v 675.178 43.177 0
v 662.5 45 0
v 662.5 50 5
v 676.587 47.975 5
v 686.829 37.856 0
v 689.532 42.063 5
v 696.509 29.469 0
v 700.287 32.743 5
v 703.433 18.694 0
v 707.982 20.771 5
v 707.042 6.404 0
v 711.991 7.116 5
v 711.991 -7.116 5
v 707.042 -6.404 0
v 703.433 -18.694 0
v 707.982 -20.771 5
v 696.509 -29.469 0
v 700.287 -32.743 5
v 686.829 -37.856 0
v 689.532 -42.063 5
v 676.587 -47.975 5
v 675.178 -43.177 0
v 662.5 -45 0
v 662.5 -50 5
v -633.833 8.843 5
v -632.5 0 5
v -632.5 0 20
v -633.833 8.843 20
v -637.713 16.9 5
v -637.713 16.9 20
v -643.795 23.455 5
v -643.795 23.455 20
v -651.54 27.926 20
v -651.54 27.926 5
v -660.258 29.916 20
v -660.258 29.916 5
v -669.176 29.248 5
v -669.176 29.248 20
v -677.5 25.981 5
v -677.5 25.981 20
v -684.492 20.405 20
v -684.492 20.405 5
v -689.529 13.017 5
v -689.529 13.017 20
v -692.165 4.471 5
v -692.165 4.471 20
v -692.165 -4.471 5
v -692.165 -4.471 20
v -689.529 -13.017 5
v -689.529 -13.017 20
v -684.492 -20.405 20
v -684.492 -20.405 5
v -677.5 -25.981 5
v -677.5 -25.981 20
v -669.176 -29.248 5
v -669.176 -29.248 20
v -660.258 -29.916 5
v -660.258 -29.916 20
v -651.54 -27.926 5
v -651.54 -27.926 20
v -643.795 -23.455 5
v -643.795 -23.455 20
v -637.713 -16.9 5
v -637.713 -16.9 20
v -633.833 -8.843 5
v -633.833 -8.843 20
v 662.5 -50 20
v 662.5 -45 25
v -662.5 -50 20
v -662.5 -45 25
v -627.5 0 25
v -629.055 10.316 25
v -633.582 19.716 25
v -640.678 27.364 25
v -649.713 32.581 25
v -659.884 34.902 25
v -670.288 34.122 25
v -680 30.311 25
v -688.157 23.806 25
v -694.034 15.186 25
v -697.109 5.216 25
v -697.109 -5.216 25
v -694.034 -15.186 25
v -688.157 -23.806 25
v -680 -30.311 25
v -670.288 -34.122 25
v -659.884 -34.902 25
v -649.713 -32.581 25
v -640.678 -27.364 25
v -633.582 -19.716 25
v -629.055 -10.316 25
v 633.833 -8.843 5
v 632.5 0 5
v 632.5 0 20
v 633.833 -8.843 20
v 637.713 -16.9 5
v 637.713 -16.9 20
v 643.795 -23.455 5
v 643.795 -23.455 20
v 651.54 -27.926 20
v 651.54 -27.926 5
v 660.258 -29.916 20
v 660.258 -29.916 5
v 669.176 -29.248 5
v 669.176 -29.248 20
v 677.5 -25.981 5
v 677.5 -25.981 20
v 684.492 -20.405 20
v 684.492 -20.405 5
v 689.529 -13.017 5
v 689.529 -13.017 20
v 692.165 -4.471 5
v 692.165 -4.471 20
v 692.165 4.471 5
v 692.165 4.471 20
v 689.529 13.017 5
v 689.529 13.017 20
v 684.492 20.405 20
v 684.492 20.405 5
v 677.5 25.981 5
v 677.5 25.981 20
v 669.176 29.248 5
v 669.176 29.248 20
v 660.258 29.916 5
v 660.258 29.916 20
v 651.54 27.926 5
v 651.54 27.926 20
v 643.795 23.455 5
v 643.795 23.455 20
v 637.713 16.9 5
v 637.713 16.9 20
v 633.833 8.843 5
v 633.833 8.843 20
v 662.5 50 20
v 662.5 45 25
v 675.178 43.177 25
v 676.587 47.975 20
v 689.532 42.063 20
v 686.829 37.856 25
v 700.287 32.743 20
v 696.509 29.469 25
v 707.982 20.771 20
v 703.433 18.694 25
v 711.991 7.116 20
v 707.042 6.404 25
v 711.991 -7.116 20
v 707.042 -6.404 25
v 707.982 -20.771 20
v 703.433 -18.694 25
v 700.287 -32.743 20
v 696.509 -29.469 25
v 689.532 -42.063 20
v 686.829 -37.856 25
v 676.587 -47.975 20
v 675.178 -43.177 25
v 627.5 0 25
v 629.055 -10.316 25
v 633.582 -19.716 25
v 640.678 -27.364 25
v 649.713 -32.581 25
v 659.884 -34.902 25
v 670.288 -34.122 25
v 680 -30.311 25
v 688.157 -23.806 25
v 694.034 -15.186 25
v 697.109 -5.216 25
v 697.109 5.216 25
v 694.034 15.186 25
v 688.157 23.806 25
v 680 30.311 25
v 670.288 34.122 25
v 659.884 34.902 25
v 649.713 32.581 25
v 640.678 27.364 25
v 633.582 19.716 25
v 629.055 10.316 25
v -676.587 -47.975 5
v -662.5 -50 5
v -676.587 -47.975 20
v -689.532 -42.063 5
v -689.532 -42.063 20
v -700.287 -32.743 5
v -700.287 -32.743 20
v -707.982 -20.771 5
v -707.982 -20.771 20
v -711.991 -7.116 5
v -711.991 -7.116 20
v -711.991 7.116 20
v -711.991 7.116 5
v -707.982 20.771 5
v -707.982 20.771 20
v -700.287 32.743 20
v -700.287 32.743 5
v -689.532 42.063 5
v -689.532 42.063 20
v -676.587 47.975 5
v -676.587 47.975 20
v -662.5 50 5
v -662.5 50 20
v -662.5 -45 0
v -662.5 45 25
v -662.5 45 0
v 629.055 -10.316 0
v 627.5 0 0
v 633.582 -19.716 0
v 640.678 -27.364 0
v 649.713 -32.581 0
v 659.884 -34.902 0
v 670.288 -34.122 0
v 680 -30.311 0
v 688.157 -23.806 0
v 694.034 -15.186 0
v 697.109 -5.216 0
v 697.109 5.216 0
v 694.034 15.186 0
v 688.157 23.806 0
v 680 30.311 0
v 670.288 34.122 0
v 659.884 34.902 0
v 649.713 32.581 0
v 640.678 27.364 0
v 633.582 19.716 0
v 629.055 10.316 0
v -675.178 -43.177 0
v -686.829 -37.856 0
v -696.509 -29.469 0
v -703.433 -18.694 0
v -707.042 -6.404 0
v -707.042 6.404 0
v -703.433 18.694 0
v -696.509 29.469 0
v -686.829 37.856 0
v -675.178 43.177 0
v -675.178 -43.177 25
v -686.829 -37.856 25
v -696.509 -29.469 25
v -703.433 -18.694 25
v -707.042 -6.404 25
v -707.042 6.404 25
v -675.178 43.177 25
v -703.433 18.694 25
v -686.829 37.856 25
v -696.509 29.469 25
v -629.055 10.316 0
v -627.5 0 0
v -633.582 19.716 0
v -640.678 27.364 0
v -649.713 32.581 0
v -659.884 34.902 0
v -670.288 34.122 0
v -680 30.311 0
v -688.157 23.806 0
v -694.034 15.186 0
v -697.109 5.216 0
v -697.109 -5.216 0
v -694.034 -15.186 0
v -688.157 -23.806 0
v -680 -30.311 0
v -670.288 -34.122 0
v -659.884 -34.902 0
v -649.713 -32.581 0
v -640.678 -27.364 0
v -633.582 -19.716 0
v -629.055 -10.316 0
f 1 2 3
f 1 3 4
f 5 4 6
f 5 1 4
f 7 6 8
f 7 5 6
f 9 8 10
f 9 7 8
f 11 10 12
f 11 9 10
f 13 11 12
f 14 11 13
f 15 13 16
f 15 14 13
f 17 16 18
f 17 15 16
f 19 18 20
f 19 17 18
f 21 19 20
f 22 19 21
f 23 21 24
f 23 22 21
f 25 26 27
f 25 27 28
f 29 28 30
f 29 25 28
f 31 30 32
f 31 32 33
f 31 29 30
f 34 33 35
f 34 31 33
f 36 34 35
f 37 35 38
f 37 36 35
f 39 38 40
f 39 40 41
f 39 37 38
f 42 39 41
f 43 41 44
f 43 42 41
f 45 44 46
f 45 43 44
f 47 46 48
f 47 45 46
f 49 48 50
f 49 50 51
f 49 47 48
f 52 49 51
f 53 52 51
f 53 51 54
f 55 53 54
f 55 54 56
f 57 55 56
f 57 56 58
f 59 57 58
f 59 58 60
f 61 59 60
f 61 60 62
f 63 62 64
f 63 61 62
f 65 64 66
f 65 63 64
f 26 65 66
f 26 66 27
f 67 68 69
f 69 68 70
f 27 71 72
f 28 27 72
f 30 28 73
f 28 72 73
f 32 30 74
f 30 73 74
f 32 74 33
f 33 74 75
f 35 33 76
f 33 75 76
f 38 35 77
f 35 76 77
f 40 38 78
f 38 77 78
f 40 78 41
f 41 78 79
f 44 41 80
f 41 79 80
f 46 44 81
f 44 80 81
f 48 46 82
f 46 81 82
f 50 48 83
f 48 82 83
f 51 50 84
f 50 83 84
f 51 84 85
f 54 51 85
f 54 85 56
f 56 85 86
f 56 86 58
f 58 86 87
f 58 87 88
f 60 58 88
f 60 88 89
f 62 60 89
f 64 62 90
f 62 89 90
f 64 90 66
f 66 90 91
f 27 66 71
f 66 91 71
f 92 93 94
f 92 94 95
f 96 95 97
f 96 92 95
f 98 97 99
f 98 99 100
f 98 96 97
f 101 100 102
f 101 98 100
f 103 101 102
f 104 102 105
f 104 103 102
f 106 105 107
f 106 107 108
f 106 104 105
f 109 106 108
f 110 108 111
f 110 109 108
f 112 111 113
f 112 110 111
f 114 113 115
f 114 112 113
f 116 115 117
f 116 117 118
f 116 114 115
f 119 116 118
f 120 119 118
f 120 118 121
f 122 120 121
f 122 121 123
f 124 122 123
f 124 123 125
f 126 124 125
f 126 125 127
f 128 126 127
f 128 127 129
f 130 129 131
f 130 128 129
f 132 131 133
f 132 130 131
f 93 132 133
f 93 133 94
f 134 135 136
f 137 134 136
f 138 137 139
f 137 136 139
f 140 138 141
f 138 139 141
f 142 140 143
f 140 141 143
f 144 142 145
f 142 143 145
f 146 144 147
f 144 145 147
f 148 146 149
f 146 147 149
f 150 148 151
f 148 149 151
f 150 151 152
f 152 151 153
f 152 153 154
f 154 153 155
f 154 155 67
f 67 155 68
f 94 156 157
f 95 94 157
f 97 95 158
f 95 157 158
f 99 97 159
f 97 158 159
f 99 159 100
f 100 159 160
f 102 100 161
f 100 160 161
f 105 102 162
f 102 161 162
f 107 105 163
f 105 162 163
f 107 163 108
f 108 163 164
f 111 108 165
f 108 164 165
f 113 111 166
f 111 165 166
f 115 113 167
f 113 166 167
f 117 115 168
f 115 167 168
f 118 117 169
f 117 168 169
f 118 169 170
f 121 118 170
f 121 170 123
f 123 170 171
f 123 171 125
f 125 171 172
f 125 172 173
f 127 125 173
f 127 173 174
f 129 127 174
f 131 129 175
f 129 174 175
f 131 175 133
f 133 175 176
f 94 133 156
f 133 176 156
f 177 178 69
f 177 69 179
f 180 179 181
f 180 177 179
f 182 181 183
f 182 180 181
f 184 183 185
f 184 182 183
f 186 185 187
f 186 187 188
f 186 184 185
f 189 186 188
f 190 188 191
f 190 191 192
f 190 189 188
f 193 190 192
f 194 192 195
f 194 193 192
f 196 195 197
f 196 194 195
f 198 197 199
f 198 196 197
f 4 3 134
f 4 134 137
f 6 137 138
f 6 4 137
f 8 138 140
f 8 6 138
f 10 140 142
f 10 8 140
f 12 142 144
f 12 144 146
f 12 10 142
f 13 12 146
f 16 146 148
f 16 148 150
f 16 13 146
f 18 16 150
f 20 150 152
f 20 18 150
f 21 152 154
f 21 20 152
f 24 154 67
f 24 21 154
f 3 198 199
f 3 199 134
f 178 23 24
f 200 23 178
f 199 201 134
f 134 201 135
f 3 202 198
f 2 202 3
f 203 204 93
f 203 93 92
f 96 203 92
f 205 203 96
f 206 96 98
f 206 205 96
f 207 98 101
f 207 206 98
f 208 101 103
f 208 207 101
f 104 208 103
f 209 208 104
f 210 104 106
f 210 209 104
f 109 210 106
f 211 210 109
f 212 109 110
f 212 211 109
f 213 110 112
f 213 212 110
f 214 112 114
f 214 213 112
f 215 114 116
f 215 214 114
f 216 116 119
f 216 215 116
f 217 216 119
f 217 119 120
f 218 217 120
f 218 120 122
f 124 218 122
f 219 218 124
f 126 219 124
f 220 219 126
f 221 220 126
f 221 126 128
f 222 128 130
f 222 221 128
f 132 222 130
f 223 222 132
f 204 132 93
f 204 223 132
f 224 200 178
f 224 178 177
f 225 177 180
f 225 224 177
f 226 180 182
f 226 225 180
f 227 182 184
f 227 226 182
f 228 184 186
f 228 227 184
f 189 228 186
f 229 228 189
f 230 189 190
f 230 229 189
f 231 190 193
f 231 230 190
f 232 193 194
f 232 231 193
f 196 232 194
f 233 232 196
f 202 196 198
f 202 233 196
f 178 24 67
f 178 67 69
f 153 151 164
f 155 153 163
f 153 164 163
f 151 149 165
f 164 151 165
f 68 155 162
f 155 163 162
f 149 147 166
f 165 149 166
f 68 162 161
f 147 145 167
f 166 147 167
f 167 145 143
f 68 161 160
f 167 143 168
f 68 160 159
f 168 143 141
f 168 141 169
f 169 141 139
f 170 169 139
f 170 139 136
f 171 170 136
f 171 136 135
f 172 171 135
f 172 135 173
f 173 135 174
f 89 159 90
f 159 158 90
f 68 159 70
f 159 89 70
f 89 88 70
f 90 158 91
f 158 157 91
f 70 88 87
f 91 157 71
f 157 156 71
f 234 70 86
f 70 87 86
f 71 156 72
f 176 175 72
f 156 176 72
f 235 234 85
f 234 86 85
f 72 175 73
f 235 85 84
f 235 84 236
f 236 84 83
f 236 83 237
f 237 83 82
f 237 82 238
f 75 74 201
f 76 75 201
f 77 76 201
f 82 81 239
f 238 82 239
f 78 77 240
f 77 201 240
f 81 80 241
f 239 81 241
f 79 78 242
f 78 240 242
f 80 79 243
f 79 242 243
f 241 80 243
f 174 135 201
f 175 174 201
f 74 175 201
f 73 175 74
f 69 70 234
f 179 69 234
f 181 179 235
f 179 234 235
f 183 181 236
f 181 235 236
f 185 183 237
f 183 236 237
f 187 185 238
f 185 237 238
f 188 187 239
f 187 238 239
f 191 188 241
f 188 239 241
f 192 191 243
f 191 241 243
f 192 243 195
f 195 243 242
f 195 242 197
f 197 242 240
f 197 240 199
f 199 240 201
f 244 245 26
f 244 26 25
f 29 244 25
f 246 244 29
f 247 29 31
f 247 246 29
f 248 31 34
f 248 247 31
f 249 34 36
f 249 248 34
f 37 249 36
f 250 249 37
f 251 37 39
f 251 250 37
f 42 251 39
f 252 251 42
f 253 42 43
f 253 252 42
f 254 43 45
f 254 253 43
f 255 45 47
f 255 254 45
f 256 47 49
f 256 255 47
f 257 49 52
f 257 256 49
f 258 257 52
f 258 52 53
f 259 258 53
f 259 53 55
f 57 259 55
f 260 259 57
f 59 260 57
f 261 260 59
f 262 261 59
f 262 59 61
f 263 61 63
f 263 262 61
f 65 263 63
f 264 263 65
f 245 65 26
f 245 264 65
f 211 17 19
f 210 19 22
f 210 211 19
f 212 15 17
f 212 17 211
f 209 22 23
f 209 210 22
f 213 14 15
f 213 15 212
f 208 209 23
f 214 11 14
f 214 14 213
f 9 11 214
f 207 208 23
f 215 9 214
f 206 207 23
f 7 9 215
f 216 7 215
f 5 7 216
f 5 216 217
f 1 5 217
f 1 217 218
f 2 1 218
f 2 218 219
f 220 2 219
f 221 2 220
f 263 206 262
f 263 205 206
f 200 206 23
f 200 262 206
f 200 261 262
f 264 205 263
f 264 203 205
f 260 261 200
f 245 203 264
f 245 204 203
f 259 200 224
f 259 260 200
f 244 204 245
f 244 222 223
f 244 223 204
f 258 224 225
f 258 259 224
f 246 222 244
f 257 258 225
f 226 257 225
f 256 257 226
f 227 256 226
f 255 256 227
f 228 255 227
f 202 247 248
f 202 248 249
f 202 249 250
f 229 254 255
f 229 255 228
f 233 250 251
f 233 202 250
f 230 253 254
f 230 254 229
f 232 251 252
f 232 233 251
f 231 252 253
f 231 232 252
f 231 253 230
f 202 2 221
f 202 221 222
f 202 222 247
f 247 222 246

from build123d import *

# Parameters (mm, degrees)
SKETCH1_R           = 30
BOSS_EXTRUDE1_DEPTH = 25
CHAMFER1_SIZE       = 5


with BuildPart() as part:
    # Sketch1 → Boss-Extrude1 (new body)
    with BuildSketch(Plane.XY):
        with BuildLine():
            Line((662.5, -50), (-662.5, -50))
            ThreePointArc((-662.5, -50), (-712.5, 0), (-662.5, 50))
            Line((-662.5, 50), (662.5, 50))
            ThreePointArc((662.5, 50), (712.5, 0), (662.5, -50))
        make_face()
        with Locations((-662.5, 0)):
            Circle(SKETCH1_R, mode=Mode.SUBTRACT)
        with Locations(Location((662.5, 0, 0), (0, 0, 180))):
            Circle(SKETCH1_R, mode=Mode.SUBTRACT)
    extrude(amount=BOSS_EXTRUDE1_DEPTH)

    # Chamfer1
    chamfer1_edges = [part.edges().sort_by_distance(p)[0] for p in [
        (712.5, 0, 25),
        (-692.5, 0, 0),
        (-692.5, 0, 25),
        (0, 50, 25),
        (692.5, 0, 0),
        (692.5, 0, 25),
        (-712.5, 0, 25),
        (0, 50, 0),
        (712.5, 0, 0),
        (0, -50, 0),
        (-712.5, 0, 0),
        (0, -50, 25),
    ]]
    chamfer(chamfer1_edges, length=CHAMFER1_SIZE)


solid = part.part
